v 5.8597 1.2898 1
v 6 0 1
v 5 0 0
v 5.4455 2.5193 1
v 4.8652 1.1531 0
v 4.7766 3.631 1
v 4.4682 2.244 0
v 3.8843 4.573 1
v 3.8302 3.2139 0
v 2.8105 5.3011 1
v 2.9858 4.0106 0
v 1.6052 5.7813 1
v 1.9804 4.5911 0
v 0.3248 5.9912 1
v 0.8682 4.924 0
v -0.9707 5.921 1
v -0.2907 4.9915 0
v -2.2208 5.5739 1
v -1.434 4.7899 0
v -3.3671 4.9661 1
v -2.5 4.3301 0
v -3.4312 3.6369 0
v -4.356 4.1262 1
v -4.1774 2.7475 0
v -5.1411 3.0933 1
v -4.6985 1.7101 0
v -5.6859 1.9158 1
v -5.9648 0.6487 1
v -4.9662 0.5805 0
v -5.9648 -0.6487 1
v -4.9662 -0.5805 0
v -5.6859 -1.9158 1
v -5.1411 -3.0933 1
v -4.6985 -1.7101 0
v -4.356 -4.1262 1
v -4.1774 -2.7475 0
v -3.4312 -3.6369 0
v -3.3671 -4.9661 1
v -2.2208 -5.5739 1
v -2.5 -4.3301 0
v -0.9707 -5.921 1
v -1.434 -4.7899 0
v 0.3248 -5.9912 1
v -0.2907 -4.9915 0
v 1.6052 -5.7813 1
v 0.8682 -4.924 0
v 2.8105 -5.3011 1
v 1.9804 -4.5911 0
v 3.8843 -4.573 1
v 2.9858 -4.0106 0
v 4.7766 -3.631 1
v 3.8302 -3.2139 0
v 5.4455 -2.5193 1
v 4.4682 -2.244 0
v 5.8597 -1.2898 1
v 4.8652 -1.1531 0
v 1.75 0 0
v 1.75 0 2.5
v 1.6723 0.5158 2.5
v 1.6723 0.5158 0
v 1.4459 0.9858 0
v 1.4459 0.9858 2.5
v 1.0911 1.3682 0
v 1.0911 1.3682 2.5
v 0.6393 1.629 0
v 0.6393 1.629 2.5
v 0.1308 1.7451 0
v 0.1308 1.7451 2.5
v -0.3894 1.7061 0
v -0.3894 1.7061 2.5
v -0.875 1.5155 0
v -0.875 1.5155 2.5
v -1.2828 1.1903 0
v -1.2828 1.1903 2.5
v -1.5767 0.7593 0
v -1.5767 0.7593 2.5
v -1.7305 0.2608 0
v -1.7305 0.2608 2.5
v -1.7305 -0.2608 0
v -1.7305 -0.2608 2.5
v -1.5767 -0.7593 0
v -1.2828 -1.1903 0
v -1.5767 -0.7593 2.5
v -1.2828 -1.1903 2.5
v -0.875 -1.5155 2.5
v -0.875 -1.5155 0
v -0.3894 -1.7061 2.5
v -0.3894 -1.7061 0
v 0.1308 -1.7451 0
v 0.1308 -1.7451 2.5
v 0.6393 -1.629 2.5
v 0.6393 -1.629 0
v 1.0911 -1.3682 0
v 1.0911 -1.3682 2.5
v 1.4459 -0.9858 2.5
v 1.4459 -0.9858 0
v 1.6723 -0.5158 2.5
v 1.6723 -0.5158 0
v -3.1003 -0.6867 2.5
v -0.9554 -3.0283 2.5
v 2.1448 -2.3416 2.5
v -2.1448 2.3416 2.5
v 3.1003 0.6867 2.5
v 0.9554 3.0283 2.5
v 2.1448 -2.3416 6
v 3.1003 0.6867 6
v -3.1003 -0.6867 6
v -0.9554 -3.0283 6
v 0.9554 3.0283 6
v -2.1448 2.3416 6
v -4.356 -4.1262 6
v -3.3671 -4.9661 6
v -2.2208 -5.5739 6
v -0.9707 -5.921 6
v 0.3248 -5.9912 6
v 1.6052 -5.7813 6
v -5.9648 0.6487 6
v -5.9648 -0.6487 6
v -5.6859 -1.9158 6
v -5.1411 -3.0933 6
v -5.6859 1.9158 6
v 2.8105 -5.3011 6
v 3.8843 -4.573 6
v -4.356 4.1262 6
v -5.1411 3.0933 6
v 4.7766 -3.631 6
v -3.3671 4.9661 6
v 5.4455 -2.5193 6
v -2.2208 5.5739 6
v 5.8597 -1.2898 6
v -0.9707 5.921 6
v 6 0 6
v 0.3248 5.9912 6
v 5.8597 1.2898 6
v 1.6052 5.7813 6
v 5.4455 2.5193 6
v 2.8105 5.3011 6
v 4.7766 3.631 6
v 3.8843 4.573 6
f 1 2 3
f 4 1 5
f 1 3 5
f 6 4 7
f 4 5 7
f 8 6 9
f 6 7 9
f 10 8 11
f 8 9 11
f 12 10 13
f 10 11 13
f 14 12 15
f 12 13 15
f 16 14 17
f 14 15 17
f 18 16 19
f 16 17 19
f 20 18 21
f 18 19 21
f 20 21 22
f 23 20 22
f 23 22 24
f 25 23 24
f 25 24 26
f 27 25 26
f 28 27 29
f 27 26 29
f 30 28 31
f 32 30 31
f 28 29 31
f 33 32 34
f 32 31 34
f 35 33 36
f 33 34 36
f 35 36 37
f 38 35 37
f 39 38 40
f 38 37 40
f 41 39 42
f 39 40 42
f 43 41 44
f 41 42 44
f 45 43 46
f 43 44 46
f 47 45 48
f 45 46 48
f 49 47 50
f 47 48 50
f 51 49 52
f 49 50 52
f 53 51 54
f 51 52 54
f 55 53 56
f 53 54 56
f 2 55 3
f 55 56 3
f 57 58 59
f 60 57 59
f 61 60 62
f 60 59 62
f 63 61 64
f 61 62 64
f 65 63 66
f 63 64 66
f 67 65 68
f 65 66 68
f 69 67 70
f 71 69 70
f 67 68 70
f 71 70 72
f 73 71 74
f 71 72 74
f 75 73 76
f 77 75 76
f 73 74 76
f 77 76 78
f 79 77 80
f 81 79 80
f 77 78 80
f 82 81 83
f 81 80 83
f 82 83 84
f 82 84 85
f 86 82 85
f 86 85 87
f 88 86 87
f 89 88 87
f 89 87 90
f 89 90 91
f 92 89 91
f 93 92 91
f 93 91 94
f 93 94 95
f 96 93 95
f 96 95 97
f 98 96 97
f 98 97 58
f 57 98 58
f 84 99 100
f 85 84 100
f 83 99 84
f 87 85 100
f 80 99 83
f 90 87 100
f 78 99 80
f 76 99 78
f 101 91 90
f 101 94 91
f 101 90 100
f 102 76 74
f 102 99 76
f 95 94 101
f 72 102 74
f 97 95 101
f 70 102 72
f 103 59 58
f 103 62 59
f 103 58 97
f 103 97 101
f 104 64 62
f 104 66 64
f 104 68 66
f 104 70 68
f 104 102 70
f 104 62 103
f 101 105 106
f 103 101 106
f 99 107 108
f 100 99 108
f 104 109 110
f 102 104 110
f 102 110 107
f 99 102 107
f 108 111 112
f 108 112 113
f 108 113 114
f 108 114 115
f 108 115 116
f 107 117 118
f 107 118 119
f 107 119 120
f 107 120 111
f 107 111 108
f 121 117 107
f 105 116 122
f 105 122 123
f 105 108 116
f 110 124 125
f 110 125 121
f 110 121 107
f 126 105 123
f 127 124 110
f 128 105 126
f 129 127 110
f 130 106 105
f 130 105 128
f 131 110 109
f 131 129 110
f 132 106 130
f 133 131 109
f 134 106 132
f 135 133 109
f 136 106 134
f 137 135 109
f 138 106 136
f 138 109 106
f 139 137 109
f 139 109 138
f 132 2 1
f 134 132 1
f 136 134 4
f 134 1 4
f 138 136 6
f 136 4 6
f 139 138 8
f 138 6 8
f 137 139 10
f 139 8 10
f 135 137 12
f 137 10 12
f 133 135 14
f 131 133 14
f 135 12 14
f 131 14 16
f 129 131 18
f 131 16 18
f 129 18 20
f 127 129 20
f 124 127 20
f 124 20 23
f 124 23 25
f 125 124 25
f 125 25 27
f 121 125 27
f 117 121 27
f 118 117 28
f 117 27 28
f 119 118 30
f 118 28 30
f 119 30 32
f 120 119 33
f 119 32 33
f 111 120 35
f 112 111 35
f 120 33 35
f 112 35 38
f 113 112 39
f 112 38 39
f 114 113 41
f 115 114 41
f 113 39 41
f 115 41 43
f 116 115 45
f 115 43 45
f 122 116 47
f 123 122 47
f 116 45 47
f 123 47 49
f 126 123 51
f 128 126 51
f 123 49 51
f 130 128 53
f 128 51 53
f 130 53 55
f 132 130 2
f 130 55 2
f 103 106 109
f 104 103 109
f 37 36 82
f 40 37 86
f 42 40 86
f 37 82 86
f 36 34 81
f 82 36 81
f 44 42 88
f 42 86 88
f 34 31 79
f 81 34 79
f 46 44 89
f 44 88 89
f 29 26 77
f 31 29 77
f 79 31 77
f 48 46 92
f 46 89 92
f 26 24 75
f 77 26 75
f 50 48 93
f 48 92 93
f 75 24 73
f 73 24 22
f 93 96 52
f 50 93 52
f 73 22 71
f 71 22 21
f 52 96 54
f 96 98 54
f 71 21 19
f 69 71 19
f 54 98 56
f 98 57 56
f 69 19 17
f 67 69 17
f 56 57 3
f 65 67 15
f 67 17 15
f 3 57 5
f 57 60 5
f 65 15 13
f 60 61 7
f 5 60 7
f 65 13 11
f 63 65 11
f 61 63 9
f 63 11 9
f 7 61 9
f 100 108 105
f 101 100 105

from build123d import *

# Parameters (mm, degrees)
SKETCH_R        = 6
PAD_DEPTH       = 6
SKETCH001_R     = 1.75
POCKET_DEPTH    = 6.001
POCKET001_DEPTH = 3.5
CHAMFER_SIZE    = 1


with BuildPart() as part:
    # Sketch → Pad (new body)
    with BuildSketch(Plane.XY):
        Circle(SKETCH_R)
    extrude(amount=PAD_DEPTH)

    # Sketch001 → Pocket (cut, through all)
    with BuildSketch(Plane.XY.offset(6)):
        Circle(SKETCH001_R)
    extrude(amount=-POCKET_DEPTH, mode=Mode.SUBTRACT)

    # Sketch002 → Pocket001 (cut)
    with BuildSketch(Plane.XY.offset(6)):
        Polygon((2.144846, -2.341574), (3.100286, 0.686704), (0.95544, 3.028278), (-2.144846, 2.341574), (-3.100286, -0.686704), (-0.95544, -3.028278), align=None)
    extrude(amount=-POCKET001_DEPTH, mode=Mode.SUBTRACT)

    # Chamfer
    chamfer_edges = [part.edges().sort_by_distance(p)[0] for p in [
        (-6, 0, 0),
    ]]
    chamfer(chamfer_edges, length=CHAMFER_SIZE)


solid = part.part
